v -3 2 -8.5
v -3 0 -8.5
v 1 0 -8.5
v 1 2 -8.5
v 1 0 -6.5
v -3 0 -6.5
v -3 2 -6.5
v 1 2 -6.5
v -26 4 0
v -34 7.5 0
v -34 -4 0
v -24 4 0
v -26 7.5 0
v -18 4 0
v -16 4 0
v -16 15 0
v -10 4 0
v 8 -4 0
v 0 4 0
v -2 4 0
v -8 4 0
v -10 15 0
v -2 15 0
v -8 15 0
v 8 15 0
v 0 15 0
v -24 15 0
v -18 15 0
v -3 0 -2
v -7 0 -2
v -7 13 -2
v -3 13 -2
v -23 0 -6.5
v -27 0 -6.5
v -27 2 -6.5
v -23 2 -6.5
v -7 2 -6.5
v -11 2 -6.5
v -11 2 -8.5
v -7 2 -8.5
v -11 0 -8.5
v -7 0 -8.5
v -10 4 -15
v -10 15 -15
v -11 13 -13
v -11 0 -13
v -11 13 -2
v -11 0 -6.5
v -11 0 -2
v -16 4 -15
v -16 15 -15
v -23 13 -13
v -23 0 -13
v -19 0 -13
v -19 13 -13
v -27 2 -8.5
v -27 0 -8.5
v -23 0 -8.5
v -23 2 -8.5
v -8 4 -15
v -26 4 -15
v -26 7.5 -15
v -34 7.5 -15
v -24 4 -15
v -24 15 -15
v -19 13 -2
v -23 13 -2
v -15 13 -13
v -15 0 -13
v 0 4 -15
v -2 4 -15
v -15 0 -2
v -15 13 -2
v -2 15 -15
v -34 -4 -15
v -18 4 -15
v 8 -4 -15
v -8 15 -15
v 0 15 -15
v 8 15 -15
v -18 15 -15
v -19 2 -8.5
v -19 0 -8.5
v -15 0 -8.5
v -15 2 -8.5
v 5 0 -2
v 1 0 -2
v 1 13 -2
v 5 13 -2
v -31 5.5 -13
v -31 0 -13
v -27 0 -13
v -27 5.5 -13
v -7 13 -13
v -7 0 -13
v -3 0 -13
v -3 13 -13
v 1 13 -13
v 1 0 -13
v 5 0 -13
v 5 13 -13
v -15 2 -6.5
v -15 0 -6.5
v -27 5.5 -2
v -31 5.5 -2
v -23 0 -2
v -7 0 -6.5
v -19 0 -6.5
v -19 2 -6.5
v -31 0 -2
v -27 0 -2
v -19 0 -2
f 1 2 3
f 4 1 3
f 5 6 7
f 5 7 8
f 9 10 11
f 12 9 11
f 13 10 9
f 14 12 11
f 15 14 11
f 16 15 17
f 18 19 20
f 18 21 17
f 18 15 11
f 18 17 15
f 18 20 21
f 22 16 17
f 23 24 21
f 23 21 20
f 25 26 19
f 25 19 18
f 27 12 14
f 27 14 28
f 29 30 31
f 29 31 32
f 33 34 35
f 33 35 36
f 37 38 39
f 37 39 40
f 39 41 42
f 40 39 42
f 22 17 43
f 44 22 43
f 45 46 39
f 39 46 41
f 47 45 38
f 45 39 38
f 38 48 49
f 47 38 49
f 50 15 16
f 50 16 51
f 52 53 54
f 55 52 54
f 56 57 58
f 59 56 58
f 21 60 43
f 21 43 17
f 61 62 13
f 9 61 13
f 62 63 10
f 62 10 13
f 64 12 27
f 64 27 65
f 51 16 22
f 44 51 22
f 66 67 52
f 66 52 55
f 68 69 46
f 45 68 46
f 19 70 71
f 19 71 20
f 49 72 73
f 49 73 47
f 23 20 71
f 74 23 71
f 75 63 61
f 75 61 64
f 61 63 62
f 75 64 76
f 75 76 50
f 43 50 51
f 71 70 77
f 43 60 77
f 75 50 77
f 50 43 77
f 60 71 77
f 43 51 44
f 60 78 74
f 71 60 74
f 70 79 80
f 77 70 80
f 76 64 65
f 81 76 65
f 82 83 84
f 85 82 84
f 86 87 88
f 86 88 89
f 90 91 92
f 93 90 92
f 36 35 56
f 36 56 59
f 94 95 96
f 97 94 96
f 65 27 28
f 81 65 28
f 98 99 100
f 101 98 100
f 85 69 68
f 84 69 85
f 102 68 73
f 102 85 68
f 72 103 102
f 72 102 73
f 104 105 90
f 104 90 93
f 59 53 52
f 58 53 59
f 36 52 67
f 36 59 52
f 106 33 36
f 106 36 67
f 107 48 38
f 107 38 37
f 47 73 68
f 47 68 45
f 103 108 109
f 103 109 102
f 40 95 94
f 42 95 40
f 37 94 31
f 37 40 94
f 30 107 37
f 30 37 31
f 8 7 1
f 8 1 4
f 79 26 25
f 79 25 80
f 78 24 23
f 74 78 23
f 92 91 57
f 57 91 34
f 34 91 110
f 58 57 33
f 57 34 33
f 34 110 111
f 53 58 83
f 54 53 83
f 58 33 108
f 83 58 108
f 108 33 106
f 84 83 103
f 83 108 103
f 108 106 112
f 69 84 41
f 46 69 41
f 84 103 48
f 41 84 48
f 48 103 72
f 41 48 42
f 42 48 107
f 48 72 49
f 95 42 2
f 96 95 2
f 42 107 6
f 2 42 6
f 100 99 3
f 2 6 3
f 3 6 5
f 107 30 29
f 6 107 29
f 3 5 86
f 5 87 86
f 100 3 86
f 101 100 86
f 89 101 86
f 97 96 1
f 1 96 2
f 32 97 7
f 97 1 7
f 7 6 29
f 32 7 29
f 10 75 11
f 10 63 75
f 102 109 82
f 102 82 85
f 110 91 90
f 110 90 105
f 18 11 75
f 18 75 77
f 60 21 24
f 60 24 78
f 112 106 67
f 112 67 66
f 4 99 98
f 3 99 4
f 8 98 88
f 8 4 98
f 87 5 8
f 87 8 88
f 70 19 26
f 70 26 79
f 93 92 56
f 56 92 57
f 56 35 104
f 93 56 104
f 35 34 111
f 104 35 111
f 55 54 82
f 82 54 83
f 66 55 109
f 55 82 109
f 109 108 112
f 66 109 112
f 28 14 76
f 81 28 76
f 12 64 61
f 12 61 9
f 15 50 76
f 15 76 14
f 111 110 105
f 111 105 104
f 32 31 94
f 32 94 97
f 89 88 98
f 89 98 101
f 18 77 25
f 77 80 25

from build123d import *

# Parameters (mm, degrees)
SKETCH1_W           = 6
SKETCH1_H           = 15
BOSS_EXTRUDE1_DEPTH = 15
SKETCH2_W           = 4
SKETCH2_H           = 11
CUT_EXTRUDE1_DEPTH  = 13
SKETCH3_W           = 15
SKETCH3_H           = 4
BOSS_EXTRUDE2_DEPTH = 2
LPATTERN1_COUNT     = 4
LPATTERN1_PITCH     = 8
SKETCH4_W           = 15
SKETCH4_H           = 15
BOSS_EXTRUDE3_DEPTH = 8
SKETCH5_W           = 4
SKETCH5_H           = 11
CUT_EXTRUDE2_DEPTH  = 5.5
SKETCH6_W           = 15
SKETCH6_H           = 15
BOSS_EXTRUDE4_DEPTH = 2
SKETCH7_W           = 36
SKETCH7_H           = 2
CUT_EXTRUDE3_DEPTH  = 2
SKETCH8_W           = 8
SKETCH8_H           = 15
CUT_EXTRUDE4_DEPTH  = 7.5
SKETCH9_W           = 42
SKETCH9_H           = 15
BOSS_EXTRUDE5_DEPTH = 4


with BuildPart() as part:
    # Sketch1 → Boss-Extrude1 (new body)
    with BuildSketch(Plane(origin=(0, 0, 0), x_dir=(1, 0, 0), z_dir=(0, 1, 0))):
        with Locations((3, 7.5)):
            Rectangle(SKETCH1_W, SKETCH1_H)
    extrude(amount=BOSS_EXTRUDE1_DEPTH)

    # Sketch2 → Cut-Extrude1 (cut)
    with BuildSketch(Plane.XZ):
        with Locations((3, -7.5)):
            Rectangle(SKETCH2_W, SKETCH2_H)
    extrude(amount=-CUT_EXTRUDE1_DEPTH, mode=Mode.SUBTRACT)

    # Sketch3 → Boss-Extrude2 (add)
    with BuildSketch(Plane.ZY):
        with Locations((-7.5, 2)):
            Rectangle(SKETCH3_W, SKETCH3_H)
    extrude(amount=BOSS_EXTRUDE2_DEPTH)


with BuildPart() as lpattern1_1:
    # LPattern1: pattern copy
    add(part.part.moved(Location(Vector(-1, 0, 0) * (1 * LPATTERN1_PITCH))))


with BuildPart() as lpattern1_2:
    # LPattern1: pattern copy
    add(part.part.moved(Location(Vector(-1, 0, 0) * (2 * LPATTERN1_PITCH))))


with BuildPart() as lpattern1_3:
    # LPattern1: pattern copy
    add(part.part.moved(Location(Vector(-1, 0, 0) * (3 * LPATTERN1_PITCH))))

    # Sketch4 → Boss-Extrude3 (add)
    with BuildSketch(Plane.ZY.offset(26)):
        with Locations((-7.5, 7.5)):
            Rectangle(SKETCH4_W, SKETCH4_H)
    extrude(amount=BOSS_EXTRUDE3_DEPTH)

    # Sketch5 → Cut-Extrude2 (cut)
    with BuildSketch(Plane.XZ):
        with Locations((-29, -7.5)):
            Rectangle(SKETCH5_W, SKETCH5_H)
    extrude(amount=-CUT_EXTRUDE2_DEPTH, mode=Mode.SUBTRACT)


with BuildPart() as lpattern1_1_1:
    add(lpattern1_1.part)

    # Combine1: union LPattern1_2, LPattern1_3, part
    add(lpattern1_2.part)
    add(lpattern1_3.part)
    add(part.part)

    # Sketch6 → Boss-Extrude4 (add)
    with BuildSketch(Plane(origin=(6, 0, 0), x_dir=(0, 0, -1), z_dir=(1, 0, 0))):
        with Locations((7.5, 7.5)):
            Rectangle(SKETCH6_W, SKETCH6_H)
    extrude(amount=BOSS_EXTRUDE4_DEPTH)

    # Sketch7 → Cut-Extrude3 (cut)
    with BuildSketch(Plane.XZ):
        with Locations((-13, -7.5)):
            Rectangle(SKETCH7_W, SKETCH7_H)
    extrude(amount=-CUT_EXTRUDE3_DEPTH, mode=Mode.SUBTRACT)

    # Sketch8 → Cut-Extrude4 (cut)
    with BuildSketch(Plane(origin=(0, 15, 0), x_dir=(1, 0, 0), z_dir=(0, 1, 0))):
        with Locations((-30, 7.5)):
            Rectangle(SKETCH8_W, SKETCH8_H)
    extrude(amount=-CUT_EXTRUDE4_DEPTH, mode=Mode.SUBTRACT)

    # Sketch9 → Boss-Extrude5 (add)
    with BuildSketch(Plane.XZ):
        with Locations((-13, -7.5)):
            Rectangle(SKETCH9_W, SKETCH9_H)
    extrude(amount=BOSS_EXTRUDE5_DEPTH)


solid = lpattern1_1_1.part
